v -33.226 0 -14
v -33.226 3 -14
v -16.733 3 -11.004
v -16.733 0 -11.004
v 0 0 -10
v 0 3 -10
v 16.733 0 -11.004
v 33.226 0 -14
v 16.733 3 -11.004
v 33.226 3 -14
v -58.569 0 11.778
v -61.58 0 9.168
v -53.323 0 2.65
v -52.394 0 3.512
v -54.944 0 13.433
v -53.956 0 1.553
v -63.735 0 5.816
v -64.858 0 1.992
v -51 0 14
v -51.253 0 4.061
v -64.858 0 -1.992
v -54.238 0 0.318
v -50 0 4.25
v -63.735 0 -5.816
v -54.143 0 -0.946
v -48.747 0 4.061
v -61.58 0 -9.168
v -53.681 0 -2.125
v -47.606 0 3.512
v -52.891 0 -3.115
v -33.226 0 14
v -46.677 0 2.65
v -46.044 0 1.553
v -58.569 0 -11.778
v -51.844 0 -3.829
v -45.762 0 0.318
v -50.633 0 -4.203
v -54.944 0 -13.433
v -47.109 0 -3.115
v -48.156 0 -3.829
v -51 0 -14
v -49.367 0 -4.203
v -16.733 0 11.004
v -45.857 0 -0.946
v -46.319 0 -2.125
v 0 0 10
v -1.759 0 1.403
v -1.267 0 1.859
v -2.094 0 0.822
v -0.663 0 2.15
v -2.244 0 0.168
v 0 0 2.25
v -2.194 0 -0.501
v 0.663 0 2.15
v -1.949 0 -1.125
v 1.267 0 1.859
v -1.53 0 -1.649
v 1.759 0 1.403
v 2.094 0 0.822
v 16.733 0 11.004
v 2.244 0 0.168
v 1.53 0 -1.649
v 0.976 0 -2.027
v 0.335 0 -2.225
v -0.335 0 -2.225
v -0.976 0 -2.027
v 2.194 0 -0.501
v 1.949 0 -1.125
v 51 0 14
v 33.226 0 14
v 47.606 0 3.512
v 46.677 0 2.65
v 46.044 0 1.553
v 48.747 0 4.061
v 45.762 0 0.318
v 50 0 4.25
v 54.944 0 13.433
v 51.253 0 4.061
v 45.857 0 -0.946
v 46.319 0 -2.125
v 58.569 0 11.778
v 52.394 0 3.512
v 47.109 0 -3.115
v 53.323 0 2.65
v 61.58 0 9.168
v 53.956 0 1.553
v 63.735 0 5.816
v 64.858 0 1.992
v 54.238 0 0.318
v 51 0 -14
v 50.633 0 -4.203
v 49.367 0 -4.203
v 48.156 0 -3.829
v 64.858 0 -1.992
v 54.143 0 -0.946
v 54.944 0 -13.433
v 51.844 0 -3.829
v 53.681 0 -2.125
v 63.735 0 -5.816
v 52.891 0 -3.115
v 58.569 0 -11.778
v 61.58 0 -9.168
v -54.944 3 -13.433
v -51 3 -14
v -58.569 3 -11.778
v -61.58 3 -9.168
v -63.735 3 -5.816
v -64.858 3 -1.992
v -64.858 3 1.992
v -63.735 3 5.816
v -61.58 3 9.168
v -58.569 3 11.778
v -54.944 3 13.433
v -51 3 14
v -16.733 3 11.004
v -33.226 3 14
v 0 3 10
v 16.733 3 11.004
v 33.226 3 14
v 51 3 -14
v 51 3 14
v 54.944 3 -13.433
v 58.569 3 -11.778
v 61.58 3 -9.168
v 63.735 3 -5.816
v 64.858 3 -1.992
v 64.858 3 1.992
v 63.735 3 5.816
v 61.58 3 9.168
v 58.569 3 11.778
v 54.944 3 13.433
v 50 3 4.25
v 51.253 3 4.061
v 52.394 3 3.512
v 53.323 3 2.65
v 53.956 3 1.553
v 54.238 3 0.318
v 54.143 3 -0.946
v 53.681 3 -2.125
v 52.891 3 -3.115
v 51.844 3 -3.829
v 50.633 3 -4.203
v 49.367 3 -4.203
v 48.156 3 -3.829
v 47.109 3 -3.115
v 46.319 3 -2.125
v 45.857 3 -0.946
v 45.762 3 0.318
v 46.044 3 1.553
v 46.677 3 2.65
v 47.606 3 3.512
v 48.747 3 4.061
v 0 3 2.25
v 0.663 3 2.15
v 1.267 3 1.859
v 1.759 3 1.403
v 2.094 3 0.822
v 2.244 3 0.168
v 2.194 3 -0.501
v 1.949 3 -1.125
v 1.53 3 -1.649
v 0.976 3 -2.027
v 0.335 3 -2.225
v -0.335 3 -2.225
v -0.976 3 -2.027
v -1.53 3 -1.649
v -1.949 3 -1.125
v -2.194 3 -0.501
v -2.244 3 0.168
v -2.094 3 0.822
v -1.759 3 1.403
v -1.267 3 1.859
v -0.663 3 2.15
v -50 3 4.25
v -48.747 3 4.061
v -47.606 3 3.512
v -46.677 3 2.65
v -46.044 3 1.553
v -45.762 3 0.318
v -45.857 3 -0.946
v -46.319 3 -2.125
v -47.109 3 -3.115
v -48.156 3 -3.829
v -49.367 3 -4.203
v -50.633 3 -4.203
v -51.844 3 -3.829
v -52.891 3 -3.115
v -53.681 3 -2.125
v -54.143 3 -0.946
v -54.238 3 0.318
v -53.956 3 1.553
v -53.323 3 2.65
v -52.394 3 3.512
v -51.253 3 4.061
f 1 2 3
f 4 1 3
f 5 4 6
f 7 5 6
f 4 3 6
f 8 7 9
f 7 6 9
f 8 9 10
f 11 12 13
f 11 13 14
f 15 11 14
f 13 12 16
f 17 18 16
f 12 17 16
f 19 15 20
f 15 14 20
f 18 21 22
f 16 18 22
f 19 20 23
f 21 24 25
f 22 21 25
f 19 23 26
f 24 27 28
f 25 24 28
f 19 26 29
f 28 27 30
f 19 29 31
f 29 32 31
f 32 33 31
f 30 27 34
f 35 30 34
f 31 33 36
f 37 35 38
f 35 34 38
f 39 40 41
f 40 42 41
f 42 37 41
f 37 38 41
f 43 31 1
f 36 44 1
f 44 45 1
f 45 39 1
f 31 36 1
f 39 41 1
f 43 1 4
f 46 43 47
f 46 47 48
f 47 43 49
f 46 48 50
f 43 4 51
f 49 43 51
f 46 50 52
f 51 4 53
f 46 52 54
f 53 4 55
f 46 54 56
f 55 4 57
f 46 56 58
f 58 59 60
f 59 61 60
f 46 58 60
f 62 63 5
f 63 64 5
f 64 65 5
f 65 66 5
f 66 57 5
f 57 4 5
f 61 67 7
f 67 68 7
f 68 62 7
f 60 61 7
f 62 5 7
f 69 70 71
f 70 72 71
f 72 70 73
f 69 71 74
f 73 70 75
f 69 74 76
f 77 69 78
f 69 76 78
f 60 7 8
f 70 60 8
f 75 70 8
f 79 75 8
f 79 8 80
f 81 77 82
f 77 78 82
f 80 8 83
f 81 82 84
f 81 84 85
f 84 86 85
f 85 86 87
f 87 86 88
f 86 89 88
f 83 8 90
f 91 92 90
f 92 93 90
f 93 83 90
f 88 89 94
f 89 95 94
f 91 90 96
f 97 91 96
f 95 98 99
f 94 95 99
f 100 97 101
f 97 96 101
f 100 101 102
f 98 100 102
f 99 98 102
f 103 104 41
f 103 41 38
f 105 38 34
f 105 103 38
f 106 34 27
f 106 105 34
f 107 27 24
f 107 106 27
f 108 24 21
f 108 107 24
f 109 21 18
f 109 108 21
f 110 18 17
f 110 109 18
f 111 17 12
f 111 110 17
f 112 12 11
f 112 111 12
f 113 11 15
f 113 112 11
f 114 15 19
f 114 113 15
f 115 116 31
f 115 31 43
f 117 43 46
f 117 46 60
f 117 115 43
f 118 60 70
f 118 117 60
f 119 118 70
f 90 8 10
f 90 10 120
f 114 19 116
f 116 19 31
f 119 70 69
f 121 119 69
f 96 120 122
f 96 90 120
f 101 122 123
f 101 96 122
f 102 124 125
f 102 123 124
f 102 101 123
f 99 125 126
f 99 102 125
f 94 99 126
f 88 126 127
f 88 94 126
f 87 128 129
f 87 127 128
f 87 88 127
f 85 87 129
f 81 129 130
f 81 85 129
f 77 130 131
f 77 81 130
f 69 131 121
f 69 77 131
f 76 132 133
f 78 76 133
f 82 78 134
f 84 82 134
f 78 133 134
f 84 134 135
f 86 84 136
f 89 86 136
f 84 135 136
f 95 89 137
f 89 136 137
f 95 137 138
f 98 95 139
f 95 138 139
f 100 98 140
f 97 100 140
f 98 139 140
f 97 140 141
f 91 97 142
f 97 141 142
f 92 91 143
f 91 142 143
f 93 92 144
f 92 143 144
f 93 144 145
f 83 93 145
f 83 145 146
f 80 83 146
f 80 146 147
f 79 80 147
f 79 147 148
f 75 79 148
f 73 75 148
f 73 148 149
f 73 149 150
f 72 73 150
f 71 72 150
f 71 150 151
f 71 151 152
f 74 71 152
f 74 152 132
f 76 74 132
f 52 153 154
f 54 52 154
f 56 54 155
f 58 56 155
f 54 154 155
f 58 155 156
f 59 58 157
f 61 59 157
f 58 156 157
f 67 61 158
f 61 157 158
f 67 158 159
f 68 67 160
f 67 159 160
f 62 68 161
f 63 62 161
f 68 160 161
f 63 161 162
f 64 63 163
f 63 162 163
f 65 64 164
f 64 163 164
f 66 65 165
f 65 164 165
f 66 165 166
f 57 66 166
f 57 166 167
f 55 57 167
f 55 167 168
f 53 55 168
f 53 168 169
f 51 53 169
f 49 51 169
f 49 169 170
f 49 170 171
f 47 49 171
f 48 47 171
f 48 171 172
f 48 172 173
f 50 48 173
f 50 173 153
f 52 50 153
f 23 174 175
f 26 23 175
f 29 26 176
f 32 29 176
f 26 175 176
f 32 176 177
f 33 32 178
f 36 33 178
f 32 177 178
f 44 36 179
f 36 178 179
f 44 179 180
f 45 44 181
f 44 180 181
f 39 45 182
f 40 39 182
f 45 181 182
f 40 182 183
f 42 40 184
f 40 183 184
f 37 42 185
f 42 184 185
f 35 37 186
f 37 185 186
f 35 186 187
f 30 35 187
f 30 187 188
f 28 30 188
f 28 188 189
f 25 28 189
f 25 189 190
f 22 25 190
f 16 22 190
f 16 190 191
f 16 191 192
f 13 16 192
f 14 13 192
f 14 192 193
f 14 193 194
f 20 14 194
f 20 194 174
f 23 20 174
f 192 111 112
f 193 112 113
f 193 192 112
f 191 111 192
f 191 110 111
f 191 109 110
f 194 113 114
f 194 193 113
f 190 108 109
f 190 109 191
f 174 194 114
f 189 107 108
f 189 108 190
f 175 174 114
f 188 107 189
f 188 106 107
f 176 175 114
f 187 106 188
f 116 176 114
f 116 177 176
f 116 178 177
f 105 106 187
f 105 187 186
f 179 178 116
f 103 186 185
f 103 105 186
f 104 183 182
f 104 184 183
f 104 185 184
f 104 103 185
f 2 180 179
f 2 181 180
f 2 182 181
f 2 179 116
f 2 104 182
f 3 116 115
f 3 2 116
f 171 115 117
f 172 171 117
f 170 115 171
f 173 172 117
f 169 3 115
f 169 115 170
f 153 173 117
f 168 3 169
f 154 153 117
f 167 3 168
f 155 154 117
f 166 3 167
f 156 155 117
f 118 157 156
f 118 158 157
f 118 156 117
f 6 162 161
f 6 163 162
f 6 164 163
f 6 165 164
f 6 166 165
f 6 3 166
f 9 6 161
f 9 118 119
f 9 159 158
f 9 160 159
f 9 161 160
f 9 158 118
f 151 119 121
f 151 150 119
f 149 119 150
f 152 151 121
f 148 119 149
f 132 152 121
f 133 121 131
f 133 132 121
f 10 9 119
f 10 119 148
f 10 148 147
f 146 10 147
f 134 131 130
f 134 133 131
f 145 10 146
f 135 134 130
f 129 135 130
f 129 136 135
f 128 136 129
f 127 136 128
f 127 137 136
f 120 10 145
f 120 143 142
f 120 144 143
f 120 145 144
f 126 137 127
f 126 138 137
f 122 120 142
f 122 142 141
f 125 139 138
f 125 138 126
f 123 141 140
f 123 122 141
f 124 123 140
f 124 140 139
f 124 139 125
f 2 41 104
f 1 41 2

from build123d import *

# Parameters (mm, degrees)
SKETCH_1_W          = 130
SKETCH_1_H          = 28
EXTRUDE_1_DEPTH     = 3
CUT_EXTRUDE_1_REACH = 68.558
SKETCH_2_R          = 4.25
SKETCH_2_R_2        = 2.25
FILLET_1_RADIUS     = 14
FILLET_1_LENGTH     = 3
CUT_EXTRUDE_3_REACH = 68.558
SKETCH_4_R          = 140
FILLET_2_RADIUS     = 14
FILLET_2_LENGTH     = 3


with BuildPart() as part:
    # 草图1 → 凸台-拉伸1 (new body)
    with BuildSketch(Plane(origin=(0, 0, 0), x_dir=(1, 0, 0), z_dir=(0, 1, 0))):
        Rectangle(SKETCH_1_W, SKETCH_1_H)
    extrude(amount=EXTRUDE_1_DEPTH)

    # 草图2 → 切除-拉伸1 (cut, up to next)
    with BuildSketch(Plane(origin=(0, 3, 0), x_dir=(1, 0, 0), z_dir=(0, 1, 0)), mode=Mode.PRIVATE) as cut_extrude_1_sk1:
        with Locations(Location((-50, 0, 0), (0, 0, 270))):
            Circle(SKETCH_2_R)
    cut_extrude_1_tool1 = extrude(cut_extrude_1_sk1.sketch, amount=-CUT_EXTRUDE_1_REACH, mode=Mode.PRIVATE) & part.part
    # 草图2 → 切除-拉伸1 (cut, up to next)
    with BuildSketch(Plane(origin=(0, 3, 0), x_dir=(1, 0, 0), z_dir=(0, 1, 0)), mode=Mode.PRIVATE) as cut_extrude_1_sk2:
        with Locations(Location((50, 0, 0), (0, 0, 270))):
            Circle(SKETCH_2_R)
    cut_extrude_1_tool2 = extrude(cut_extrude_1_sk2.sketch, amount=-CUT_EXTRUDE_1_REACH, mode=Mode.PRIVATE) & part.part
    # 草图2 → 切除-拉伸1 (cut, up to next)
    with BuildSketch(Plane(origin=(0, 3, 0), x_dir=(1, 0, 0), z_dir=(0, 1, 0)), mode=Mode.PRIVATE) as cut_extrude_1_sk3:
        with Locations(Location((0, 0, 0), (0, 0, 270))):
            Circle(SKETCH_2_R_2)
    cut_extrude_1_tool3 = extrude(cut_extrude_1_sk3.sketch, amount=-CUT_EXTRUDE_1_REACH, mode=Mode.PRIVATE) & part.part
    add(cut_extrude_1_tool1.solids().sort_by_distance((-50, 3, 0))[0], mode=Mode.SUBTRACT)
    add(cut_extrude_1_tool2.solids().sort_by_distance((50, 3, 0))[0], mode=Mode.SUBTRACT)
    add(cut_extrude_1_tool3.solids().sort_by_distance((0, 3, 0))[0], mode=Mode.SUBTRACT)

    # 圆角1: full round fillet: the end face becomes a half cylinder, R = half its width
    fillet_1_face = Plane((-65, 1.5, 0), x_dir=(0, 1, 0), z_dir=(-1, 0, 0))  # on the end face: x along it, z out of the body
    fillet_1_slab = fillet_1_face.offset(-FILLET_1_RADIUS / 2) * Box(FILLET_1_LENGTH, 2 * FILLET_1_RADIUS, FILLET_1_RADIUS, mode=Mode.PRIVATE)  # the body's end, R deep
    fillet_1_round = Plane((-51, 1.5, 0), x_dir=(-1, 0, 0), z_dir=(0, 1, 0)) * Cylinder(FILLET_1_RADIUS, FILLET_1_LENGTH, mode=Mode.PRIVATE)  # its axis R under the face
    add(fillet_1_slab - fillet_1_round, mode=Mode.SUBTRACT)

    # 草图4 → 切除-拉伸3 (cut, up to next)
    with BuildSketch(Plane(origin=(0, 3, 0), x_dir=(1, 0, 0), z_dir=(0, 1, 0)), mode=Mode.PRIVATE) as cut_extrude_3_sk1:
        with Locations((0, 150)):
            Circle(SKETCH_4_R)
    cut_extrude_3_tool1 = extrude(cut_extrude_3_sk1.sketch, amount=-CUT_EXTRUDE_3_REACH, mode=Mode.PRIVATE) & part.part
    cut_extrude_3 = cut_extrude_3_tool1.solids().sort_by_distance((0, 3, -150))[0]
    add(cut_extrude_3, mode=Mode.SUBTRACT)

    # 镜向1: 切除-拉伸3 across plane
    add(cut_extrude_3.mirror(Plane.XY), mode=Mode.SUBTRACT)

    # 圆角2: full round fillet: the end face becomes a half cylinder, R = half its width
    fillet_2_face = Plane((65, 1.5, 0), x_dir=(0, -1, 0), z_dir=(1, 0, 0))  # on the end face: x along it, z out of the body
    fillet_2_slab = fillet_2_face.offset(-FILLET_2_RADIUS / 2) * Box(FILLET_2_LENGTH, 2 * FILLET_2_RADIUS, FILLET_2_RADIUS, mode=Mode.PRIVATE)  # the body's end, R deep
    fillet_2_round = Plane((51, 1.5, 0), x_dir=(1, 0, 0), z_dir=(0, -1, 0)) * Cylinder(FILLET_2_RADIUS, FILLET_2_LENGTH, mode=Mode.PRIVATE)  # its axis R under the face
    add(fillet_2_slab - fillet_2_round, mode=Mode.SUBTRACT)


solid = part.part
